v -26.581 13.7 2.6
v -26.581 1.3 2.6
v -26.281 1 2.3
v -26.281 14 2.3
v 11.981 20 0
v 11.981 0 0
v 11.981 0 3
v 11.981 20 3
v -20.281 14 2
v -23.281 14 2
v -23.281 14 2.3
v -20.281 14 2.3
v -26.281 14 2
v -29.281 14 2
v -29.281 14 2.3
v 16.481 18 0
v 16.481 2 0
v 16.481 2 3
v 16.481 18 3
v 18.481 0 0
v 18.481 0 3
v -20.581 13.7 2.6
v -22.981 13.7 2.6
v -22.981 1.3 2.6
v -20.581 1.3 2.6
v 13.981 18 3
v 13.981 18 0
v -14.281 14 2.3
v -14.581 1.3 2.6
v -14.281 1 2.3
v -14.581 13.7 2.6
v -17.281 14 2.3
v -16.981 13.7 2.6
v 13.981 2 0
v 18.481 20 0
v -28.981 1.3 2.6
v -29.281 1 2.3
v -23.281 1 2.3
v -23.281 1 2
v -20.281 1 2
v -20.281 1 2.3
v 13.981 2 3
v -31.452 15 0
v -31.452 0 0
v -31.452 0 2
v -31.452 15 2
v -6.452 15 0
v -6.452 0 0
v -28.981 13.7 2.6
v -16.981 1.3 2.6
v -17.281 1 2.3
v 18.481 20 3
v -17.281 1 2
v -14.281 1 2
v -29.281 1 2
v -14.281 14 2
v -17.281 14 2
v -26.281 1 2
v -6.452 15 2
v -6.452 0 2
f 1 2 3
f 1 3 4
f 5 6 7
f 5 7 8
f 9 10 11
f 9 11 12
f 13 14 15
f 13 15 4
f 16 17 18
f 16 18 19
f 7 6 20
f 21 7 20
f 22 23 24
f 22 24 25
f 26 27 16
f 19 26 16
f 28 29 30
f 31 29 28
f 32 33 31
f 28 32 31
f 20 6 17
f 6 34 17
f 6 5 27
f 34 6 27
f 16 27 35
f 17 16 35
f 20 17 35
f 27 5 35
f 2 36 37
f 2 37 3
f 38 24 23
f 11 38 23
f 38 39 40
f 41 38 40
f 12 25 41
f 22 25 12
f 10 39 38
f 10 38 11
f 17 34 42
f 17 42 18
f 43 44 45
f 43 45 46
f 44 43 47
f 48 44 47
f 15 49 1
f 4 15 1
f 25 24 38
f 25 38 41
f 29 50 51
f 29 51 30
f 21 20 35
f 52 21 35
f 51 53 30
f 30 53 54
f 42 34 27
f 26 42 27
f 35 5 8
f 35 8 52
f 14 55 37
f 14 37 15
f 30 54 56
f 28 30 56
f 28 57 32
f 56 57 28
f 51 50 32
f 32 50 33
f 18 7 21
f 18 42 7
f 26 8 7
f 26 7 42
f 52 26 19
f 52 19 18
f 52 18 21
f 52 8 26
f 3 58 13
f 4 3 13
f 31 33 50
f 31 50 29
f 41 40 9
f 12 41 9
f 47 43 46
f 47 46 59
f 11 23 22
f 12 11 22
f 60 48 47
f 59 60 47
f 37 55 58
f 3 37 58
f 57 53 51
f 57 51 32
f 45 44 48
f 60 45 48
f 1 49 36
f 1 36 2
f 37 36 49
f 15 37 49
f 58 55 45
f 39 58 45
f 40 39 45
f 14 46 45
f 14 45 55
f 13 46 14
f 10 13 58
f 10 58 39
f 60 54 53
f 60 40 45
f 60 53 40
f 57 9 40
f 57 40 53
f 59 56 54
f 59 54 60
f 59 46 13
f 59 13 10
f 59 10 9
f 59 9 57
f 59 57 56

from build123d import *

# Parameters (mm, degrees)
F0_W     = 25
F0_H     = 15
F1_DEPTH = 2
F0_W_2   = 6.5
F0_H_2   = 20
F0_W_3   = 2.5
F0_H_3   = 16
F2_DEPTH = 3
F3_W     = 3
F3_H     = 13
F4_DEPTH = 0.6
F5_SIZE  = 0.3


with BuildPart() as f1:
    # F0 (on Top) → F1 (new body)
    with BuildSketch(Plane.XY):
        with Locations((-18.951613, 7.5)):
            Rectangle(F0_W, F0_H)
    extrude(amount=F1_DEPTH)

    # F3 (on face) → F4 (join)
    with BuildSketch(Plane.XY.offset(2)):
        with Locations((-27.781075, 7.5)):
            Rectangle(F3_W, F3_H)
        with Locations((-21.781075, 7.5)):
            Rectangle(F3_W, F3_H)
        with Locations((-15.781075, 7.5)):
            Rectangle(F3_W, F3_H)
    extrude(amount=F4_DEPTH)

    # F5
    f5_edges = [f1.edges().sort_by_distance(p)[0] for p in [
        (-27.781075, 14, 2.6),
        (-29.281075, 7.5, 2.6),
        (-27.781075, 1, 2.6),
        (-26.281075, 7.5, 2.6),
        (-21.781075, 14, 2.6),
        (-23.281075, 7.5, 2.6),
        (-21.781075, 1, 2.6),
        (-20.281075, 7.5, 2.6),
        (-14.281075, 7.5, 2.6),
        (-15.781075, 14, 2.6),
        (-17.281075, 7.5, 2.6),
        (-15.781075, 1, 2.6),
    ]]
    chamfer(f5_edges, length=F5_SIZE)


with BuildPart() as f2:
    # F0 (on Top) → F2 (new body)
    with BuildSketch(Plane.XY):
        with Locations((15.230984, 10)):
            Rectangle(F0_W_2, F0_H_2)
        with Locations((15.230984, 10)):
            Rectangle(F0_W_3, F0_H_3, mode=Mode.SUBTRACT)
    extrude(amount=F2_DEPTH)


solid = Compound([f1.part, f2.part])
